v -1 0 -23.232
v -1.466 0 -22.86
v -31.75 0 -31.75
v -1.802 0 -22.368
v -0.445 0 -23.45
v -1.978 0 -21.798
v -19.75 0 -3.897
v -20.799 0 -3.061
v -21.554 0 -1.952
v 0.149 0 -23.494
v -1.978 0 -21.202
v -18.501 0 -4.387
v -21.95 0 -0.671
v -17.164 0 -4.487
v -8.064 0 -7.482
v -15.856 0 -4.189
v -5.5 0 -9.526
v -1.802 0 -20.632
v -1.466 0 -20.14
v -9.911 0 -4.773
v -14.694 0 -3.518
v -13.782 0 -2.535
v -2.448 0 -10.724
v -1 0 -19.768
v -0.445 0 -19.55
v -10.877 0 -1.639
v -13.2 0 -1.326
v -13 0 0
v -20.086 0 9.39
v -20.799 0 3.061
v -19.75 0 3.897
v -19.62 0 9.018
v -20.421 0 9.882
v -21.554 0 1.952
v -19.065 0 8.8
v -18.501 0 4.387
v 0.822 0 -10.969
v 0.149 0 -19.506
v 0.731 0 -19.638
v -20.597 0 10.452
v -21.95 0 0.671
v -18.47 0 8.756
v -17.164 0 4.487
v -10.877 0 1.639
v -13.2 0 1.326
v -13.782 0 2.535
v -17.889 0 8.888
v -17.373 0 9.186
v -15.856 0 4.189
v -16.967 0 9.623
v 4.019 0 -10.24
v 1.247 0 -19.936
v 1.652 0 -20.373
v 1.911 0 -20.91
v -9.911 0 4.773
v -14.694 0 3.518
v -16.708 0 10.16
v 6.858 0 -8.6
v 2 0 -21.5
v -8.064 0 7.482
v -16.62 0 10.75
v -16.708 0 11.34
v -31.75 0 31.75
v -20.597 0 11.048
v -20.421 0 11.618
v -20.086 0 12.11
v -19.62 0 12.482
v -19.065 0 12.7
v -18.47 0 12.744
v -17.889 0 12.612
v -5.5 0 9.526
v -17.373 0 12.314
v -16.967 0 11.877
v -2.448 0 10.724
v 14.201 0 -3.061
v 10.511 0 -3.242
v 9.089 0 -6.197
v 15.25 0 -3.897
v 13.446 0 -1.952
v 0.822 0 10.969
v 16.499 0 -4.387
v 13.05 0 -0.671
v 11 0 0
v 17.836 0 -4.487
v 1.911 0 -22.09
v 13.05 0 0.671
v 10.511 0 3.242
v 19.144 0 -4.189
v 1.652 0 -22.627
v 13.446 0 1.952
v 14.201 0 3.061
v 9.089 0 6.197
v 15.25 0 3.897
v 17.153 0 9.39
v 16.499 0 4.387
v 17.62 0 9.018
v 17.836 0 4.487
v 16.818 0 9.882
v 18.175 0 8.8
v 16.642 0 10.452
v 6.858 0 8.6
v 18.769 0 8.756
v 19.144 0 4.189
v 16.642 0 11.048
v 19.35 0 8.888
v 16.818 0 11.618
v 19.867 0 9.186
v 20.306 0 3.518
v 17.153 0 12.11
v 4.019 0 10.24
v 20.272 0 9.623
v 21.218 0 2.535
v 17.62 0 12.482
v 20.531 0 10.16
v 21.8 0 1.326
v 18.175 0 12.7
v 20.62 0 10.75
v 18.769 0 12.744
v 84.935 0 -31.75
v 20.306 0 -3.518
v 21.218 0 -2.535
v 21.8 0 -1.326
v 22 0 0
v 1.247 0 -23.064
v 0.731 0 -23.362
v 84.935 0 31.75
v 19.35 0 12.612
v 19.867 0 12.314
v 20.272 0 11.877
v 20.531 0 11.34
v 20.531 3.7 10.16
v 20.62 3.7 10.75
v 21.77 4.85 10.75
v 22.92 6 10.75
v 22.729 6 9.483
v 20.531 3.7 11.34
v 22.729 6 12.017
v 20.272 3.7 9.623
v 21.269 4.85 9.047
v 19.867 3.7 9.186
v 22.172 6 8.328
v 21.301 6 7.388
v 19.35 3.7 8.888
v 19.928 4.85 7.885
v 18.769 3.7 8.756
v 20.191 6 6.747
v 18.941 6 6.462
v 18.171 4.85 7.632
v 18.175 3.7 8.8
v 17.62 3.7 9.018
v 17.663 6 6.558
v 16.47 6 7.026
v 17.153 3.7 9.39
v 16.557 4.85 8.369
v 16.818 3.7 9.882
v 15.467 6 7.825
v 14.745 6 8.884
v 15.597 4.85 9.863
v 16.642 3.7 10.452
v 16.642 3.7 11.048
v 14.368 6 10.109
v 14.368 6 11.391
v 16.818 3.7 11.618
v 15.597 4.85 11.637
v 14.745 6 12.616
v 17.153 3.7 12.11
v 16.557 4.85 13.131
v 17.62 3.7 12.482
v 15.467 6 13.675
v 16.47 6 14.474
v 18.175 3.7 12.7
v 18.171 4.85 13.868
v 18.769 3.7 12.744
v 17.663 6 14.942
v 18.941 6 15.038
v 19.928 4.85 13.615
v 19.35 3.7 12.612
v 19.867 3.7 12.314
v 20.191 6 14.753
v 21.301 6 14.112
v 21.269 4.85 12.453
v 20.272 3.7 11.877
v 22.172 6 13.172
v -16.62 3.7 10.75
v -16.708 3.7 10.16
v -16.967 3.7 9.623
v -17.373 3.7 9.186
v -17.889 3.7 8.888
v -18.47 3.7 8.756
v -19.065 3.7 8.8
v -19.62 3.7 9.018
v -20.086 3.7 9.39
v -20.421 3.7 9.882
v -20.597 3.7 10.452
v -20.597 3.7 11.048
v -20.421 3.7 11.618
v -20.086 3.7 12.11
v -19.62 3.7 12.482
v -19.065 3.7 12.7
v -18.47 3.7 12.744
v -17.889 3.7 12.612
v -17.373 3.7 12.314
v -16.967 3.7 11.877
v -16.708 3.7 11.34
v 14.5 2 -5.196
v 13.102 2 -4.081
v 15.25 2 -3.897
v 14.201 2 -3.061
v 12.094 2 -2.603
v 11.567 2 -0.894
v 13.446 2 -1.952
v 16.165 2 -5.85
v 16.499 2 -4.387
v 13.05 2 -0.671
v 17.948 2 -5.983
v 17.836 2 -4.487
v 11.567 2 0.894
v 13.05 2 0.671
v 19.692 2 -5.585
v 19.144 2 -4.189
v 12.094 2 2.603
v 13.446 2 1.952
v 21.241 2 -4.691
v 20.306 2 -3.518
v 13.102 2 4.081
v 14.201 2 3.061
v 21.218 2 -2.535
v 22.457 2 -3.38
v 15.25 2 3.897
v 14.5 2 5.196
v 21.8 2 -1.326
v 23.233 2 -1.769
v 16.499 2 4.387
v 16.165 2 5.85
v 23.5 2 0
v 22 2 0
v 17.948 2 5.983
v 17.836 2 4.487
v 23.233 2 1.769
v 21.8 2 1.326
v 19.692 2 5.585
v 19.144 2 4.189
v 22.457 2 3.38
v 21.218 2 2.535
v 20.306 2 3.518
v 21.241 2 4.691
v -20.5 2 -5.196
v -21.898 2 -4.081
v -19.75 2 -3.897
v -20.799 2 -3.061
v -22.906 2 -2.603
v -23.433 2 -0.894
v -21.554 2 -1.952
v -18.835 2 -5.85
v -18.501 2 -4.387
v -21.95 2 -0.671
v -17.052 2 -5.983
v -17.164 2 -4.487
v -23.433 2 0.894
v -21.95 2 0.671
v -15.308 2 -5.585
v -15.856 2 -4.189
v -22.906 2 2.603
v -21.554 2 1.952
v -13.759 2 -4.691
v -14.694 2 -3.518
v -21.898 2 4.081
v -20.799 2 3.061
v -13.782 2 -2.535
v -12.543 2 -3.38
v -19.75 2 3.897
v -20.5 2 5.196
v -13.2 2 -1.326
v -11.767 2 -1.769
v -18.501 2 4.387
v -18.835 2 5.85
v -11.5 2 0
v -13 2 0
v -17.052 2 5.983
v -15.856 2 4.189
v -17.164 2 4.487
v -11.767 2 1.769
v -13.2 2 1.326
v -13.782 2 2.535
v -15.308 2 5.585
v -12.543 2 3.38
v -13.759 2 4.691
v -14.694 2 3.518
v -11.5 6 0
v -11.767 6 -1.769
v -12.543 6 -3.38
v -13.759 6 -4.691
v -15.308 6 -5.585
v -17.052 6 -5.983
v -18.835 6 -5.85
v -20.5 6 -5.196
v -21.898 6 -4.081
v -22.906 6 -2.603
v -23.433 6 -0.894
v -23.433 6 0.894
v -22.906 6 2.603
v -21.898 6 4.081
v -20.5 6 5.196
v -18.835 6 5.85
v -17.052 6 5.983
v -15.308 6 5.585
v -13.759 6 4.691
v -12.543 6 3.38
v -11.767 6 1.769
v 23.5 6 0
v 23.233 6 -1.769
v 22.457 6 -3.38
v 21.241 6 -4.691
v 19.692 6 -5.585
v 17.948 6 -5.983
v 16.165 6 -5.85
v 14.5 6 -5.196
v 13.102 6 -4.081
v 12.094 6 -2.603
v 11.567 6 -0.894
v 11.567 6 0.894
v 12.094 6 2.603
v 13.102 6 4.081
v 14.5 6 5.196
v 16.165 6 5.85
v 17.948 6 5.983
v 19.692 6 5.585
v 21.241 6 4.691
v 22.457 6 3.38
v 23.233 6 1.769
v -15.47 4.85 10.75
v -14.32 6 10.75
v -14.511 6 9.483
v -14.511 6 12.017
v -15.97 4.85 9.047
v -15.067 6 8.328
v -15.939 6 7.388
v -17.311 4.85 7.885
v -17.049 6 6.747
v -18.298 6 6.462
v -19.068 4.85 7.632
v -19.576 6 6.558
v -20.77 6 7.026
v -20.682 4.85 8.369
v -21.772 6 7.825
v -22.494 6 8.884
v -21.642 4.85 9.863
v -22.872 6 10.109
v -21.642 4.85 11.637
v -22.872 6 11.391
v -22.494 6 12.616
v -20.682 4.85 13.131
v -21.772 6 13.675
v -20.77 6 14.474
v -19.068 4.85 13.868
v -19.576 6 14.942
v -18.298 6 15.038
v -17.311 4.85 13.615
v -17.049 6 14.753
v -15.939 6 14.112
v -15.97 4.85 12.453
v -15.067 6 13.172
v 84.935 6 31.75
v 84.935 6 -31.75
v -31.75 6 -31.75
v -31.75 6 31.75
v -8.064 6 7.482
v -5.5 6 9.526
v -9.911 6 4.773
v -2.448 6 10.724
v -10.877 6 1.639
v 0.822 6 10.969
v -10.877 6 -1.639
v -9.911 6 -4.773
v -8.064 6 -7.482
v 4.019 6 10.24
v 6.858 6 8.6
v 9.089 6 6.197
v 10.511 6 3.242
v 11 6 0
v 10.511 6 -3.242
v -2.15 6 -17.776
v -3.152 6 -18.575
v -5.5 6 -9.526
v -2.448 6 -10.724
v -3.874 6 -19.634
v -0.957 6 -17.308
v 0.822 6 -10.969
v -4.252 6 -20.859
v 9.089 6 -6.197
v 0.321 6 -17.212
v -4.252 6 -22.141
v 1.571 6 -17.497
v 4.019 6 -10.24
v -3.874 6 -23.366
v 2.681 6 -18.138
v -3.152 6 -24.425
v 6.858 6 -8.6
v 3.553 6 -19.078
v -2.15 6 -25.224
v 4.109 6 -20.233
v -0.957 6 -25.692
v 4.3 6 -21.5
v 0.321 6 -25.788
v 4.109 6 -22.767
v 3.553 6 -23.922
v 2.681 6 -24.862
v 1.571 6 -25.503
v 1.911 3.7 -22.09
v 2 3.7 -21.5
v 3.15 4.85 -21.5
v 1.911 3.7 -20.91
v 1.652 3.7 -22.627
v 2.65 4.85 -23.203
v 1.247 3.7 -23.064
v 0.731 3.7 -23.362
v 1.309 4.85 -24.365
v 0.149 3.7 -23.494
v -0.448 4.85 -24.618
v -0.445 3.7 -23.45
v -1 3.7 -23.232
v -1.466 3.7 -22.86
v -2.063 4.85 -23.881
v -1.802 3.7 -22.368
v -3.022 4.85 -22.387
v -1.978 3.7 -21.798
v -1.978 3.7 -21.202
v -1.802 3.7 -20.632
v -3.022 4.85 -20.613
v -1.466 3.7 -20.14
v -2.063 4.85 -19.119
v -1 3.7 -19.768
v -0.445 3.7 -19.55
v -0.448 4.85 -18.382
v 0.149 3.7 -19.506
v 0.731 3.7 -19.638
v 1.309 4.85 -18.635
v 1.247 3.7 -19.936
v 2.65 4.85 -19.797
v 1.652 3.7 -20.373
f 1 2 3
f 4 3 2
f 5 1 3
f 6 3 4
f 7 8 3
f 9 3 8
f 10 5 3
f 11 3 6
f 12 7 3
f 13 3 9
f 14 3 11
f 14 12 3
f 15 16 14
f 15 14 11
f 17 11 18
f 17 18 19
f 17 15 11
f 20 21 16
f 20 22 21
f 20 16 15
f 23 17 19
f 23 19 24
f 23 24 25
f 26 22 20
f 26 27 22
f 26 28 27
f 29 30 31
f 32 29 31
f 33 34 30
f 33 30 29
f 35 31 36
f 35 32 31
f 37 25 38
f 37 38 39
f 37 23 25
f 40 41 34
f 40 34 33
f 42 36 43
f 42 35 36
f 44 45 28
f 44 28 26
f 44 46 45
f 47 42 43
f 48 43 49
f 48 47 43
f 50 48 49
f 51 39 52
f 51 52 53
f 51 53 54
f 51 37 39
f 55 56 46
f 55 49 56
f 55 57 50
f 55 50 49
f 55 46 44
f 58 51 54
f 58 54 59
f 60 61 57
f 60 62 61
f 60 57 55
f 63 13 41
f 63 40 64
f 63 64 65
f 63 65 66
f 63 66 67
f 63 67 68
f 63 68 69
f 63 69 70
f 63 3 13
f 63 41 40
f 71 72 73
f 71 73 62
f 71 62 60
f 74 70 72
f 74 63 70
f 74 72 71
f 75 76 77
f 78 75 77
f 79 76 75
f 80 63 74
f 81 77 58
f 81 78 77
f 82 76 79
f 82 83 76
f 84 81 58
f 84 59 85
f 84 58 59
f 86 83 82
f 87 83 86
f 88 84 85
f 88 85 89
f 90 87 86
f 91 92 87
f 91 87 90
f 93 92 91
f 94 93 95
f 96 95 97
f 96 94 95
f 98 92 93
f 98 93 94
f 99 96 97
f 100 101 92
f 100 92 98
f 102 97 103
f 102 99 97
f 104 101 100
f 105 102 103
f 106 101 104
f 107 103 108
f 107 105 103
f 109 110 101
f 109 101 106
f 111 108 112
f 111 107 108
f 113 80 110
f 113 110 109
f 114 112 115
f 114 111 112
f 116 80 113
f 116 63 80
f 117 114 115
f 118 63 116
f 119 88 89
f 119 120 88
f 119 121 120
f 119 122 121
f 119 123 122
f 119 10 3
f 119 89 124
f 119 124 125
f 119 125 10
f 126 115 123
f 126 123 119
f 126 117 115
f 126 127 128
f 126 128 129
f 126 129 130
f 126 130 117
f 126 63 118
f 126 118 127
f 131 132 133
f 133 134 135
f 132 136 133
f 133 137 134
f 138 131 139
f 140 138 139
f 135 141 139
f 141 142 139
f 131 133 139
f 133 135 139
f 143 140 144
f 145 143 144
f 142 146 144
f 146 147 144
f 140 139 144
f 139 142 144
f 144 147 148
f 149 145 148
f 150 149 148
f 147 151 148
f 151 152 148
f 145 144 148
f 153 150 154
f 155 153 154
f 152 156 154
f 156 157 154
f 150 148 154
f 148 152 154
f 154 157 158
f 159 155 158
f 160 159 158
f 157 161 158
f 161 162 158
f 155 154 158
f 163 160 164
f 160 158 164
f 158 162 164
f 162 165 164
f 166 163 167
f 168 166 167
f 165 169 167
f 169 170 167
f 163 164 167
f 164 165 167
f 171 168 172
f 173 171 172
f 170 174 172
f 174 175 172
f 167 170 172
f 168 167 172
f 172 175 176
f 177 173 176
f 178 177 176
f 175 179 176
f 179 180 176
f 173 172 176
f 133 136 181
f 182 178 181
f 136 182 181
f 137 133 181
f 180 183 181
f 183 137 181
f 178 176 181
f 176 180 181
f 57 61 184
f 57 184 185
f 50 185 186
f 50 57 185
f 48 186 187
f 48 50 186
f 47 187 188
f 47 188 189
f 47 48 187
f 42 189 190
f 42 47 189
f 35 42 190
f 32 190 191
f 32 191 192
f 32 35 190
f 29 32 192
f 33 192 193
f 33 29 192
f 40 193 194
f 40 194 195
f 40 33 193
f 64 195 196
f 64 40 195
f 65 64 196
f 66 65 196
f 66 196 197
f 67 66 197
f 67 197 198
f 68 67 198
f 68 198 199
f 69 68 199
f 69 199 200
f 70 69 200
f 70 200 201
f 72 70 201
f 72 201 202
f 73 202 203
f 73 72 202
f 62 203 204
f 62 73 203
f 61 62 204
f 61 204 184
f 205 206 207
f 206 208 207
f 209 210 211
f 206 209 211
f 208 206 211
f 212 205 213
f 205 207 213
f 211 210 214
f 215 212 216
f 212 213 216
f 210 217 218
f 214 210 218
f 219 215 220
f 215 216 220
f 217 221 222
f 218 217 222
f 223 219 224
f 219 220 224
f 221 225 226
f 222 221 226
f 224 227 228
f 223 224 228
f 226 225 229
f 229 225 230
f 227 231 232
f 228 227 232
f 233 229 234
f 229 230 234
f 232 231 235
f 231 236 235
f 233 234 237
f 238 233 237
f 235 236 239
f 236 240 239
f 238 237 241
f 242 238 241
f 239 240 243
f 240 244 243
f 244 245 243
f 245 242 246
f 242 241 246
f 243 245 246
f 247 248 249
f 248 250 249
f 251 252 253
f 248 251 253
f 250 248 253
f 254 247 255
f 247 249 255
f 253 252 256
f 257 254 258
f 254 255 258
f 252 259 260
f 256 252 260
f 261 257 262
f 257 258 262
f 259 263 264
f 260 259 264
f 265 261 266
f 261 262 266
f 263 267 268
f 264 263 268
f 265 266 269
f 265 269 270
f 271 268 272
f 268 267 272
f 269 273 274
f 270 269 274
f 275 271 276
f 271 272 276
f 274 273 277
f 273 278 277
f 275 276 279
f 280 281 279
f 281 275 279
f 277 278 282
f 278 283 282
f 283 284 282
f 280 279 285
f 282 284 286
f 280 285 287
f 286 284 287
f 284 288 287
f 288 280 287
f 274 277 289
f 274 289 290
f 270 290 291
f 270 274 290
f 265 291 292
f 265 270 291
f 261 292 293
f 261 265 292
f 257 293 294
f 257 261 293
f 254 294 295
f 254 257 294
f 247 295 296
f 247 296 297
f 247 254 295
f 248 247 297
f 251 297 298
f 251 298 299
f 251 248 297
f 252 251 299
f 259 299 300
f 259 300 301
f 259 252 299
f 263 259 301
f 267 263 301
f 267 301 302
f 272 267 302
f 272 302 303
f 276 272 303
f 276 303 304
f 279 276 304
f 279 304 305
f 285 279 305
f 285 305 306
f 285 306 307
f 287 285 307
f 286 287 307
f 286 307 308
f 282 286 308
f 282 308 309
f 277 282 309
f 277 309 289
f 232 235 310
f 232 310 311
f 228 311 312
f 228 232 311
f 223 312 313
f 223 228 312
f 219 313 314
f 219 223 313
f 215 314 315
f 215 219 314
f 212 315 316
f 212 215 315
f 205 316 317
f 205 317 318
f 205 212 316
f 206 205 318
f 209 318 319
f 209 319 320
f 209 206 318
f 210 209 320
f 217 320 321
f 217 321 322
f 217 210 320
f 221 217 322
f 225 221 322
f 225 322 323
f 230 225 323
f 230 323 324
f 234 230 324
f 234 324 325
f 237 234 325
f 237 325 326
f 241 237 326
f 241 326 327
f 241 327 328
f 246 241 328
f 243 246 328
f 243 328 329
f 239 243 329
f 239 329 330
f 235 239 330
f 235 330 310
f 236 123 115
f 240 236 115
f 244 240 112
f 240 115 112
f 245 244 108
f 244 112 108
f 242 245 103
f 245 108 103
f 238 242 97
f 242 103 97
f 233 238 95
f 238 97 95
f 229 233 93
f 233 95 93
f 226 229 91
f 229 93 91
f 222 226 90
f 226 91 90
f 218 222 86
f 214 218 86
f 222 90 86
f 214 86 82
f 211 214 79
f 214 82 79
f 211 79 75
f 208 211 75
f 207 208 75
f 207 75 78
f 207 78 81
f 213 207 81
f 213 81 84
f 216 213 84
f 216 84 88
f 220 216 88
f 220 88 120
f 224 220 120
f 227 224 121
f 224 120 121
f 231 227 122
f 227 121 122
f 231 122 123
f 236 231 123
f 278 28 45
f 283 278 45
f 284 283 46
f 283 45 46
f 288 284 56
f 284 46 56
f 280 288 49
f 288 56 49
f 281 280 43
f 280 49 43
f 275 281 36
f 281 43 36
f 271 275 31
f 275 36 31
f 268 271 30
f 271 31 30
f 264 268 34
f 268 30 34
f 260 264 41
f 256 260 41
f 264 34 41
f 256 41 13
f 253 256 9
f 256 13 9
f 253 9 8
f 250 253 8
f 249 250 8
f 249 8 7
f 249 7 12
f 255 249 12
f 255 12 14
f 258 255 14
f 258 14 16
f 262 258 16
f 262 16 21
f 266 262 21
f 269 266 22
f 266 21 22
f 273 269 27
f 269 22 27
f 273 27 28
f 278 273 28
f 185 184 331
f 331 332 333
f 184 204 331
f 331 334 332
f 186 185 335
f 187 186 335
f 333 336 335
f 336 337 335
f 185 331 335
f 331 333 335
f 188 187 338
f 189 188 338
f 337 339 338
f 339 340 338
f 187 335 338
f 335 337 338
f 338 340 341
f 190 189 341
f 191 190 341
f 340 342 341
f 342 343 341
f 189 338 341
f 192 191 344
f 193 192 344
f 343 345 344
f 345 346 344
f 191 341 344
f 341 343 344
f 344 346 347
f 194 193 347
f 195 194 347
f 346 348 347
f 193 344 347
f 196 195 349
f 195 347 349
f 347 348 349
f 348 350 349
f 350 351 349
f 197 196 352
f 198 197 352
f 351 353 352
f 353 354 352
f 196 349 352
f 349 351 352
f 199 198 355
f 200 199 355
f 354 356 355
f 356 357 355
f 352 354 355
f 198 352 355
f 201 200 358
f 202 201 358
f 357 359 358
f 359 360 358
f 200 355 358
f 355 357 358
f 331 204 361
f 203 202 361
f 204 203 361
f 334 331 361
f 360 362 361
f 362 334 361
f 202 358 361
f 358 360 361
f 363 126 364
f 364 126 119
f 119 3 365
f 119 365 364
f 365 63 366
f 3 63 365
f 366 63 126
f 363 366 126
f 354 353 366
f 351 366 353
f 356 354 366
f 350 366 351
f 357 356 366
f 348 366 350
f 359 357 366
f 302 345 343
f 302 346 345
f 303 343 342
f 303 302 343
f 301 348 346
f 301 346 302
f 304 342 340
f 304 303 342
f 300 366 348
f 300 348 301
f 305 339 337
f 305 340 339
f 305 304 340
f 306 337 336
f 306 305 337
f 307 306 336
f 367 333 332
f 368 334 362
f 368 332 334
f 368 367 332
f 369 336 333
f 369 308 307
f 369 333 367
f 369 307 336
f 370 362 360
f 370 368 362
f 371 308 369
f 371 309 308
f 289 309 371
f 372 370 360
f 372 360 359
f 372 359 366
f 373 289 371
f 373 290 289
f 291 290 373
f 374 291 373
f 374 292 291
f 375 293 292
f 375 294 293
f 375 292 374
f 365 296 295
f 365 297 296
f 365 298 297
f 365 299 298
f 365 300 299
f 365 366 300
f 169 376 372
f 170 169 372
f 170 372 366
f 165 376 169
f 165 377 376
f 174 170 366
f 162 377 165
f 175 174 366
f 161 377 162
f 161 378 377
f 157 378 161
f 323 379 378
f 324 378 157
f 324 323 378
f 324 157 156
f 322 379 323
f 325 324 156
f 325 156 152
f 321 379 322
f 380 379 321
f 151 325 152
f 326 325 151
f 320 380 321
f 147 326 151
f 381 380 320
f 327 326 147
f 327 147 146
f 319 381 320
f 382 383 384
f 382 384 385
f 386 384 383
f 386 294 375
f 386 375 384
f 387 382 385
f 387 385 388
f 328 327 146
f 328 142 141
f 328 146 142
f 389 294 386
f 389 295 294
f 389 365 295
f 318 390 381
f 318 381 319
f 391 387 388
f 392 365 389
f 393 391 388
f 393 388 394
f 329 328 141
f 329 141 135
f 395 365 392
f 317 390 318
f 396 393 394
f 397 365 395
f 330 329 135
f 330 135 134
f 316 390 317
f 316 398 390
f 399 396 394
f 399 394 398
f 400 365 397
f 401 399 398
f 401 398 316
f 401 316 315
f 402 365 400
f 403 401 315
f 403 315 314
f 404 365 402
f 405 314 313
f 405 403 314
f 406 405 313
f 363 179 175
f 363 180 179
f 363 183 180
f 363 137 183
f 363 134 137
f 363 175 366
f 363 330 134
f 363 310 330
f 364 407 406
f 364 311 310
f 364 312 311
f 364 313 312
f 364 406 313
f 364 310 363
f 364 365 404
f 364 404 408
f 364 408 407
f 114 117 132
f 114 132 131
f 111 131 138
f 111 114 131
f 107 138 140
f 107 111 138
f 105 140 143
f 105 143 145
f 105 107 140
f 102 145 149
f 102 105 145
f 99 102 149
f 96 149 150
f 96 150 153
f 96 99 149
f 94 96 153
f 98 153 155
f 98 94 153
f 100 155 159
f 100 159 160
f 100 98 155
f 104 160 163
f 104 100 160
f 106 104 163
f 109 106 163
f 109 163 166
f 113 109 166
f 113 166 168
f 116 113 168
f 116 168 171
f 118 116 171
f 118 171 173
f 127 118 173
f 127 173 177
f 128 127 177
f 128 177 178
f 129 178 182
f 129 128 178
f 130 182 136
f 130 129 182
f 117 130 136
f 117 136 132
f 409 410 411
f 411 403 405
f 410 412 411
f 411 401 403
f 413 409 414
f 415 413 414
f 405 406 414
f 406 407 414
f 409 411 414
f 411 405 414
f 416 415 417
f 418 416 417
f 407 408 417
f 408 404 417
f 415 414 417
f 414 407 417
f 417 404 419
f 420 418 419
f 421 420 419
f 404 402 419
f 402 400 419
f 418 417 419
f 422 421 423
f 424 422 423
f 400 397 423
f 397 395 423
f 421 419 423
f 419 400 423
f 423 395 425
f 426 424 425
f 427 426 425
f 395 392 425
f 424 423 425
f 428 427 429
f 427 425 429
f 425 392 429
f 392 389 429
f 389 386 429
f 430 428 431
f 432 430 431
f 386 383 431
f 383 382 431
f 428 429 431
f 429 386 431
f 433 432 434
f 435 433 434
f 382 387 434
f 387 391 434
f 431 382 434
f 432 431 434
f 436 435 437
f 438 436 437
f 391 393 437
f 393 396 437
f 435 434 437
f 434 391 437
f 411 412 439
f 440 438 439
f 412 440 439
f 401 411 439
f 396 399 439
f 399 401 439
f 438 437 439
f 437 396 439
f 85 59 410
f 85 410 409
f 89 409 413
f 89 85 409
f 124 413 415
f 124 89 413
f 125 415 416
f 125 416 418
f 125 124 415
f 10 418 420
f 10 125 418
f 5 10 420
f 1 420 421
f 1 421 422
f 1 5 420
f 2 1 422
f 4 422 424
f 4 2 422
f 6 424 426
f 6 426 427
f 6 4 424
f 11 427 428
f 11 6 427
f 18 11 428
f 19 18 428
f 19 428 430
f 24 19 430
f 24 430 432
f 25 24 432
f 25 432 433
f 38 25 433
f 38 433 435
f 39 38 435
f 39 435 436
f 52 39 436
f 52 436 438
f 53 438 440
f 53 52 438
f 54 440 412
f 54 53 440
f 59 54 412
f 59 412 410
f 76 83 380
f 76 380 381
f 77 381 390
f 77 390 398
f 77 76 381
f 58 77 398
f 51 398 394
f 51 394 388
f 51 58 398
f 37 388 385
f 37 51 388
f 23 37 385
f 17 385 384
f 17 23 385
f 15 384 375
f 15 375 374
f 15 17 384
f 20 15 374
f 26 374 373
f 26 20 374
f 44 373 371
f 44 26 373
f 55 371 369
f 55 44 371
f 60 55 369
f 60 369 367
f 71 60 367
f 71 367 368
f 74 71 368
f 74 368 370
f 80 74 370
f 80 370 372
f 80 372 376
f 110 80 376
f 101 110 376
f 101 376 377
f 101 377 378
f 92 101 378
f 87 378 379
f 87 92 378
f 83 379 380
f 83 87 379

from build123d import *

# Parameters (mm, degrees)
SKETCH1_W           = 116.684502442
SKETCH1_H           = 63.5
SKETCH1_R           = 11
SKETCH1_R_2         = 2
SKETCH1_R_3         = 6
BOSS_EXTRUDE1_DEPTH = 6
CHAMFER1_SIZE       = 2.3
SKETCH2_R           = 6
SKETCH2_R_2         = 4.5
BOSS_EXTRUDE2_DEPTH = 2


with BuildPart() as part:
    # Sketch1 → Boss-Extrude1 (new body)
    with BuildSketch(Plane(origin=(0, 0, 0), x_dir=(1, 0, 0), z_dir=(0, 1, 0))):
        with Locations((26.592251221, 0)):
            Rectangle(SKETCH1_W, SKETCH1_H)
        Circle(SKETCH1_R, mode=Mode.SUBTRACT)
        with Locations((0, 21.5)):
            Circle(SKETCH1_R_2, mode=Mode.SUBTRACT)
        with Locations((18.619546181, -10.75)):
            Circle(SKETCH1_R_2, mode=Mode.SUBTRACT)
        with Locations((-18.619546181, -10.75)):
            Circle(SKETCH1_R_2, mode=Mode.SUBTRACT)
        with Locations((17.5, 0)):
            Circle(SKETCH1_R_3, mode=Mode.SUBTRACT)
        with Locations((-17.5, 0)):
            Circle(SKETCH1_R_3, mode=Mode.SUBTRACT)
    extrude(amount=BOSS_EXTRUDE1_DEPTH)

    # Chamfer1
    chamfer1_edges = [part.edges().sort_by_distance(p)[0] for p in [
        (-2, 6, -21.5),
        (16.619546181, 6, 10.75),
        (-20.619546181, 6, 10.75),
    ]]
    chamfer(chamfer1_edges, length=CHAMFER1_SIZE)

    # Sketch2 → Boss-Extrude2 (add)
    with BuildSketch(Plane.XZ):
        with Locations((-17.5, 0)):
            Circle(SKETCH2_R)
        with Locations((-17.5, 0)):
            Circle(SKETCH2_R_2, mode=Mode.SUBTRACT)
        with Locations((17.5, 0)):
            Circle(SKETCH2_R)
        with Locations((17.5, 0)):
            Circle(SKETCH2_R_2, mode=Mode.SUBTRACT)
    extrude(amount=-BOSS_EXTRUDE2_DEPTH)


solid = part.part
